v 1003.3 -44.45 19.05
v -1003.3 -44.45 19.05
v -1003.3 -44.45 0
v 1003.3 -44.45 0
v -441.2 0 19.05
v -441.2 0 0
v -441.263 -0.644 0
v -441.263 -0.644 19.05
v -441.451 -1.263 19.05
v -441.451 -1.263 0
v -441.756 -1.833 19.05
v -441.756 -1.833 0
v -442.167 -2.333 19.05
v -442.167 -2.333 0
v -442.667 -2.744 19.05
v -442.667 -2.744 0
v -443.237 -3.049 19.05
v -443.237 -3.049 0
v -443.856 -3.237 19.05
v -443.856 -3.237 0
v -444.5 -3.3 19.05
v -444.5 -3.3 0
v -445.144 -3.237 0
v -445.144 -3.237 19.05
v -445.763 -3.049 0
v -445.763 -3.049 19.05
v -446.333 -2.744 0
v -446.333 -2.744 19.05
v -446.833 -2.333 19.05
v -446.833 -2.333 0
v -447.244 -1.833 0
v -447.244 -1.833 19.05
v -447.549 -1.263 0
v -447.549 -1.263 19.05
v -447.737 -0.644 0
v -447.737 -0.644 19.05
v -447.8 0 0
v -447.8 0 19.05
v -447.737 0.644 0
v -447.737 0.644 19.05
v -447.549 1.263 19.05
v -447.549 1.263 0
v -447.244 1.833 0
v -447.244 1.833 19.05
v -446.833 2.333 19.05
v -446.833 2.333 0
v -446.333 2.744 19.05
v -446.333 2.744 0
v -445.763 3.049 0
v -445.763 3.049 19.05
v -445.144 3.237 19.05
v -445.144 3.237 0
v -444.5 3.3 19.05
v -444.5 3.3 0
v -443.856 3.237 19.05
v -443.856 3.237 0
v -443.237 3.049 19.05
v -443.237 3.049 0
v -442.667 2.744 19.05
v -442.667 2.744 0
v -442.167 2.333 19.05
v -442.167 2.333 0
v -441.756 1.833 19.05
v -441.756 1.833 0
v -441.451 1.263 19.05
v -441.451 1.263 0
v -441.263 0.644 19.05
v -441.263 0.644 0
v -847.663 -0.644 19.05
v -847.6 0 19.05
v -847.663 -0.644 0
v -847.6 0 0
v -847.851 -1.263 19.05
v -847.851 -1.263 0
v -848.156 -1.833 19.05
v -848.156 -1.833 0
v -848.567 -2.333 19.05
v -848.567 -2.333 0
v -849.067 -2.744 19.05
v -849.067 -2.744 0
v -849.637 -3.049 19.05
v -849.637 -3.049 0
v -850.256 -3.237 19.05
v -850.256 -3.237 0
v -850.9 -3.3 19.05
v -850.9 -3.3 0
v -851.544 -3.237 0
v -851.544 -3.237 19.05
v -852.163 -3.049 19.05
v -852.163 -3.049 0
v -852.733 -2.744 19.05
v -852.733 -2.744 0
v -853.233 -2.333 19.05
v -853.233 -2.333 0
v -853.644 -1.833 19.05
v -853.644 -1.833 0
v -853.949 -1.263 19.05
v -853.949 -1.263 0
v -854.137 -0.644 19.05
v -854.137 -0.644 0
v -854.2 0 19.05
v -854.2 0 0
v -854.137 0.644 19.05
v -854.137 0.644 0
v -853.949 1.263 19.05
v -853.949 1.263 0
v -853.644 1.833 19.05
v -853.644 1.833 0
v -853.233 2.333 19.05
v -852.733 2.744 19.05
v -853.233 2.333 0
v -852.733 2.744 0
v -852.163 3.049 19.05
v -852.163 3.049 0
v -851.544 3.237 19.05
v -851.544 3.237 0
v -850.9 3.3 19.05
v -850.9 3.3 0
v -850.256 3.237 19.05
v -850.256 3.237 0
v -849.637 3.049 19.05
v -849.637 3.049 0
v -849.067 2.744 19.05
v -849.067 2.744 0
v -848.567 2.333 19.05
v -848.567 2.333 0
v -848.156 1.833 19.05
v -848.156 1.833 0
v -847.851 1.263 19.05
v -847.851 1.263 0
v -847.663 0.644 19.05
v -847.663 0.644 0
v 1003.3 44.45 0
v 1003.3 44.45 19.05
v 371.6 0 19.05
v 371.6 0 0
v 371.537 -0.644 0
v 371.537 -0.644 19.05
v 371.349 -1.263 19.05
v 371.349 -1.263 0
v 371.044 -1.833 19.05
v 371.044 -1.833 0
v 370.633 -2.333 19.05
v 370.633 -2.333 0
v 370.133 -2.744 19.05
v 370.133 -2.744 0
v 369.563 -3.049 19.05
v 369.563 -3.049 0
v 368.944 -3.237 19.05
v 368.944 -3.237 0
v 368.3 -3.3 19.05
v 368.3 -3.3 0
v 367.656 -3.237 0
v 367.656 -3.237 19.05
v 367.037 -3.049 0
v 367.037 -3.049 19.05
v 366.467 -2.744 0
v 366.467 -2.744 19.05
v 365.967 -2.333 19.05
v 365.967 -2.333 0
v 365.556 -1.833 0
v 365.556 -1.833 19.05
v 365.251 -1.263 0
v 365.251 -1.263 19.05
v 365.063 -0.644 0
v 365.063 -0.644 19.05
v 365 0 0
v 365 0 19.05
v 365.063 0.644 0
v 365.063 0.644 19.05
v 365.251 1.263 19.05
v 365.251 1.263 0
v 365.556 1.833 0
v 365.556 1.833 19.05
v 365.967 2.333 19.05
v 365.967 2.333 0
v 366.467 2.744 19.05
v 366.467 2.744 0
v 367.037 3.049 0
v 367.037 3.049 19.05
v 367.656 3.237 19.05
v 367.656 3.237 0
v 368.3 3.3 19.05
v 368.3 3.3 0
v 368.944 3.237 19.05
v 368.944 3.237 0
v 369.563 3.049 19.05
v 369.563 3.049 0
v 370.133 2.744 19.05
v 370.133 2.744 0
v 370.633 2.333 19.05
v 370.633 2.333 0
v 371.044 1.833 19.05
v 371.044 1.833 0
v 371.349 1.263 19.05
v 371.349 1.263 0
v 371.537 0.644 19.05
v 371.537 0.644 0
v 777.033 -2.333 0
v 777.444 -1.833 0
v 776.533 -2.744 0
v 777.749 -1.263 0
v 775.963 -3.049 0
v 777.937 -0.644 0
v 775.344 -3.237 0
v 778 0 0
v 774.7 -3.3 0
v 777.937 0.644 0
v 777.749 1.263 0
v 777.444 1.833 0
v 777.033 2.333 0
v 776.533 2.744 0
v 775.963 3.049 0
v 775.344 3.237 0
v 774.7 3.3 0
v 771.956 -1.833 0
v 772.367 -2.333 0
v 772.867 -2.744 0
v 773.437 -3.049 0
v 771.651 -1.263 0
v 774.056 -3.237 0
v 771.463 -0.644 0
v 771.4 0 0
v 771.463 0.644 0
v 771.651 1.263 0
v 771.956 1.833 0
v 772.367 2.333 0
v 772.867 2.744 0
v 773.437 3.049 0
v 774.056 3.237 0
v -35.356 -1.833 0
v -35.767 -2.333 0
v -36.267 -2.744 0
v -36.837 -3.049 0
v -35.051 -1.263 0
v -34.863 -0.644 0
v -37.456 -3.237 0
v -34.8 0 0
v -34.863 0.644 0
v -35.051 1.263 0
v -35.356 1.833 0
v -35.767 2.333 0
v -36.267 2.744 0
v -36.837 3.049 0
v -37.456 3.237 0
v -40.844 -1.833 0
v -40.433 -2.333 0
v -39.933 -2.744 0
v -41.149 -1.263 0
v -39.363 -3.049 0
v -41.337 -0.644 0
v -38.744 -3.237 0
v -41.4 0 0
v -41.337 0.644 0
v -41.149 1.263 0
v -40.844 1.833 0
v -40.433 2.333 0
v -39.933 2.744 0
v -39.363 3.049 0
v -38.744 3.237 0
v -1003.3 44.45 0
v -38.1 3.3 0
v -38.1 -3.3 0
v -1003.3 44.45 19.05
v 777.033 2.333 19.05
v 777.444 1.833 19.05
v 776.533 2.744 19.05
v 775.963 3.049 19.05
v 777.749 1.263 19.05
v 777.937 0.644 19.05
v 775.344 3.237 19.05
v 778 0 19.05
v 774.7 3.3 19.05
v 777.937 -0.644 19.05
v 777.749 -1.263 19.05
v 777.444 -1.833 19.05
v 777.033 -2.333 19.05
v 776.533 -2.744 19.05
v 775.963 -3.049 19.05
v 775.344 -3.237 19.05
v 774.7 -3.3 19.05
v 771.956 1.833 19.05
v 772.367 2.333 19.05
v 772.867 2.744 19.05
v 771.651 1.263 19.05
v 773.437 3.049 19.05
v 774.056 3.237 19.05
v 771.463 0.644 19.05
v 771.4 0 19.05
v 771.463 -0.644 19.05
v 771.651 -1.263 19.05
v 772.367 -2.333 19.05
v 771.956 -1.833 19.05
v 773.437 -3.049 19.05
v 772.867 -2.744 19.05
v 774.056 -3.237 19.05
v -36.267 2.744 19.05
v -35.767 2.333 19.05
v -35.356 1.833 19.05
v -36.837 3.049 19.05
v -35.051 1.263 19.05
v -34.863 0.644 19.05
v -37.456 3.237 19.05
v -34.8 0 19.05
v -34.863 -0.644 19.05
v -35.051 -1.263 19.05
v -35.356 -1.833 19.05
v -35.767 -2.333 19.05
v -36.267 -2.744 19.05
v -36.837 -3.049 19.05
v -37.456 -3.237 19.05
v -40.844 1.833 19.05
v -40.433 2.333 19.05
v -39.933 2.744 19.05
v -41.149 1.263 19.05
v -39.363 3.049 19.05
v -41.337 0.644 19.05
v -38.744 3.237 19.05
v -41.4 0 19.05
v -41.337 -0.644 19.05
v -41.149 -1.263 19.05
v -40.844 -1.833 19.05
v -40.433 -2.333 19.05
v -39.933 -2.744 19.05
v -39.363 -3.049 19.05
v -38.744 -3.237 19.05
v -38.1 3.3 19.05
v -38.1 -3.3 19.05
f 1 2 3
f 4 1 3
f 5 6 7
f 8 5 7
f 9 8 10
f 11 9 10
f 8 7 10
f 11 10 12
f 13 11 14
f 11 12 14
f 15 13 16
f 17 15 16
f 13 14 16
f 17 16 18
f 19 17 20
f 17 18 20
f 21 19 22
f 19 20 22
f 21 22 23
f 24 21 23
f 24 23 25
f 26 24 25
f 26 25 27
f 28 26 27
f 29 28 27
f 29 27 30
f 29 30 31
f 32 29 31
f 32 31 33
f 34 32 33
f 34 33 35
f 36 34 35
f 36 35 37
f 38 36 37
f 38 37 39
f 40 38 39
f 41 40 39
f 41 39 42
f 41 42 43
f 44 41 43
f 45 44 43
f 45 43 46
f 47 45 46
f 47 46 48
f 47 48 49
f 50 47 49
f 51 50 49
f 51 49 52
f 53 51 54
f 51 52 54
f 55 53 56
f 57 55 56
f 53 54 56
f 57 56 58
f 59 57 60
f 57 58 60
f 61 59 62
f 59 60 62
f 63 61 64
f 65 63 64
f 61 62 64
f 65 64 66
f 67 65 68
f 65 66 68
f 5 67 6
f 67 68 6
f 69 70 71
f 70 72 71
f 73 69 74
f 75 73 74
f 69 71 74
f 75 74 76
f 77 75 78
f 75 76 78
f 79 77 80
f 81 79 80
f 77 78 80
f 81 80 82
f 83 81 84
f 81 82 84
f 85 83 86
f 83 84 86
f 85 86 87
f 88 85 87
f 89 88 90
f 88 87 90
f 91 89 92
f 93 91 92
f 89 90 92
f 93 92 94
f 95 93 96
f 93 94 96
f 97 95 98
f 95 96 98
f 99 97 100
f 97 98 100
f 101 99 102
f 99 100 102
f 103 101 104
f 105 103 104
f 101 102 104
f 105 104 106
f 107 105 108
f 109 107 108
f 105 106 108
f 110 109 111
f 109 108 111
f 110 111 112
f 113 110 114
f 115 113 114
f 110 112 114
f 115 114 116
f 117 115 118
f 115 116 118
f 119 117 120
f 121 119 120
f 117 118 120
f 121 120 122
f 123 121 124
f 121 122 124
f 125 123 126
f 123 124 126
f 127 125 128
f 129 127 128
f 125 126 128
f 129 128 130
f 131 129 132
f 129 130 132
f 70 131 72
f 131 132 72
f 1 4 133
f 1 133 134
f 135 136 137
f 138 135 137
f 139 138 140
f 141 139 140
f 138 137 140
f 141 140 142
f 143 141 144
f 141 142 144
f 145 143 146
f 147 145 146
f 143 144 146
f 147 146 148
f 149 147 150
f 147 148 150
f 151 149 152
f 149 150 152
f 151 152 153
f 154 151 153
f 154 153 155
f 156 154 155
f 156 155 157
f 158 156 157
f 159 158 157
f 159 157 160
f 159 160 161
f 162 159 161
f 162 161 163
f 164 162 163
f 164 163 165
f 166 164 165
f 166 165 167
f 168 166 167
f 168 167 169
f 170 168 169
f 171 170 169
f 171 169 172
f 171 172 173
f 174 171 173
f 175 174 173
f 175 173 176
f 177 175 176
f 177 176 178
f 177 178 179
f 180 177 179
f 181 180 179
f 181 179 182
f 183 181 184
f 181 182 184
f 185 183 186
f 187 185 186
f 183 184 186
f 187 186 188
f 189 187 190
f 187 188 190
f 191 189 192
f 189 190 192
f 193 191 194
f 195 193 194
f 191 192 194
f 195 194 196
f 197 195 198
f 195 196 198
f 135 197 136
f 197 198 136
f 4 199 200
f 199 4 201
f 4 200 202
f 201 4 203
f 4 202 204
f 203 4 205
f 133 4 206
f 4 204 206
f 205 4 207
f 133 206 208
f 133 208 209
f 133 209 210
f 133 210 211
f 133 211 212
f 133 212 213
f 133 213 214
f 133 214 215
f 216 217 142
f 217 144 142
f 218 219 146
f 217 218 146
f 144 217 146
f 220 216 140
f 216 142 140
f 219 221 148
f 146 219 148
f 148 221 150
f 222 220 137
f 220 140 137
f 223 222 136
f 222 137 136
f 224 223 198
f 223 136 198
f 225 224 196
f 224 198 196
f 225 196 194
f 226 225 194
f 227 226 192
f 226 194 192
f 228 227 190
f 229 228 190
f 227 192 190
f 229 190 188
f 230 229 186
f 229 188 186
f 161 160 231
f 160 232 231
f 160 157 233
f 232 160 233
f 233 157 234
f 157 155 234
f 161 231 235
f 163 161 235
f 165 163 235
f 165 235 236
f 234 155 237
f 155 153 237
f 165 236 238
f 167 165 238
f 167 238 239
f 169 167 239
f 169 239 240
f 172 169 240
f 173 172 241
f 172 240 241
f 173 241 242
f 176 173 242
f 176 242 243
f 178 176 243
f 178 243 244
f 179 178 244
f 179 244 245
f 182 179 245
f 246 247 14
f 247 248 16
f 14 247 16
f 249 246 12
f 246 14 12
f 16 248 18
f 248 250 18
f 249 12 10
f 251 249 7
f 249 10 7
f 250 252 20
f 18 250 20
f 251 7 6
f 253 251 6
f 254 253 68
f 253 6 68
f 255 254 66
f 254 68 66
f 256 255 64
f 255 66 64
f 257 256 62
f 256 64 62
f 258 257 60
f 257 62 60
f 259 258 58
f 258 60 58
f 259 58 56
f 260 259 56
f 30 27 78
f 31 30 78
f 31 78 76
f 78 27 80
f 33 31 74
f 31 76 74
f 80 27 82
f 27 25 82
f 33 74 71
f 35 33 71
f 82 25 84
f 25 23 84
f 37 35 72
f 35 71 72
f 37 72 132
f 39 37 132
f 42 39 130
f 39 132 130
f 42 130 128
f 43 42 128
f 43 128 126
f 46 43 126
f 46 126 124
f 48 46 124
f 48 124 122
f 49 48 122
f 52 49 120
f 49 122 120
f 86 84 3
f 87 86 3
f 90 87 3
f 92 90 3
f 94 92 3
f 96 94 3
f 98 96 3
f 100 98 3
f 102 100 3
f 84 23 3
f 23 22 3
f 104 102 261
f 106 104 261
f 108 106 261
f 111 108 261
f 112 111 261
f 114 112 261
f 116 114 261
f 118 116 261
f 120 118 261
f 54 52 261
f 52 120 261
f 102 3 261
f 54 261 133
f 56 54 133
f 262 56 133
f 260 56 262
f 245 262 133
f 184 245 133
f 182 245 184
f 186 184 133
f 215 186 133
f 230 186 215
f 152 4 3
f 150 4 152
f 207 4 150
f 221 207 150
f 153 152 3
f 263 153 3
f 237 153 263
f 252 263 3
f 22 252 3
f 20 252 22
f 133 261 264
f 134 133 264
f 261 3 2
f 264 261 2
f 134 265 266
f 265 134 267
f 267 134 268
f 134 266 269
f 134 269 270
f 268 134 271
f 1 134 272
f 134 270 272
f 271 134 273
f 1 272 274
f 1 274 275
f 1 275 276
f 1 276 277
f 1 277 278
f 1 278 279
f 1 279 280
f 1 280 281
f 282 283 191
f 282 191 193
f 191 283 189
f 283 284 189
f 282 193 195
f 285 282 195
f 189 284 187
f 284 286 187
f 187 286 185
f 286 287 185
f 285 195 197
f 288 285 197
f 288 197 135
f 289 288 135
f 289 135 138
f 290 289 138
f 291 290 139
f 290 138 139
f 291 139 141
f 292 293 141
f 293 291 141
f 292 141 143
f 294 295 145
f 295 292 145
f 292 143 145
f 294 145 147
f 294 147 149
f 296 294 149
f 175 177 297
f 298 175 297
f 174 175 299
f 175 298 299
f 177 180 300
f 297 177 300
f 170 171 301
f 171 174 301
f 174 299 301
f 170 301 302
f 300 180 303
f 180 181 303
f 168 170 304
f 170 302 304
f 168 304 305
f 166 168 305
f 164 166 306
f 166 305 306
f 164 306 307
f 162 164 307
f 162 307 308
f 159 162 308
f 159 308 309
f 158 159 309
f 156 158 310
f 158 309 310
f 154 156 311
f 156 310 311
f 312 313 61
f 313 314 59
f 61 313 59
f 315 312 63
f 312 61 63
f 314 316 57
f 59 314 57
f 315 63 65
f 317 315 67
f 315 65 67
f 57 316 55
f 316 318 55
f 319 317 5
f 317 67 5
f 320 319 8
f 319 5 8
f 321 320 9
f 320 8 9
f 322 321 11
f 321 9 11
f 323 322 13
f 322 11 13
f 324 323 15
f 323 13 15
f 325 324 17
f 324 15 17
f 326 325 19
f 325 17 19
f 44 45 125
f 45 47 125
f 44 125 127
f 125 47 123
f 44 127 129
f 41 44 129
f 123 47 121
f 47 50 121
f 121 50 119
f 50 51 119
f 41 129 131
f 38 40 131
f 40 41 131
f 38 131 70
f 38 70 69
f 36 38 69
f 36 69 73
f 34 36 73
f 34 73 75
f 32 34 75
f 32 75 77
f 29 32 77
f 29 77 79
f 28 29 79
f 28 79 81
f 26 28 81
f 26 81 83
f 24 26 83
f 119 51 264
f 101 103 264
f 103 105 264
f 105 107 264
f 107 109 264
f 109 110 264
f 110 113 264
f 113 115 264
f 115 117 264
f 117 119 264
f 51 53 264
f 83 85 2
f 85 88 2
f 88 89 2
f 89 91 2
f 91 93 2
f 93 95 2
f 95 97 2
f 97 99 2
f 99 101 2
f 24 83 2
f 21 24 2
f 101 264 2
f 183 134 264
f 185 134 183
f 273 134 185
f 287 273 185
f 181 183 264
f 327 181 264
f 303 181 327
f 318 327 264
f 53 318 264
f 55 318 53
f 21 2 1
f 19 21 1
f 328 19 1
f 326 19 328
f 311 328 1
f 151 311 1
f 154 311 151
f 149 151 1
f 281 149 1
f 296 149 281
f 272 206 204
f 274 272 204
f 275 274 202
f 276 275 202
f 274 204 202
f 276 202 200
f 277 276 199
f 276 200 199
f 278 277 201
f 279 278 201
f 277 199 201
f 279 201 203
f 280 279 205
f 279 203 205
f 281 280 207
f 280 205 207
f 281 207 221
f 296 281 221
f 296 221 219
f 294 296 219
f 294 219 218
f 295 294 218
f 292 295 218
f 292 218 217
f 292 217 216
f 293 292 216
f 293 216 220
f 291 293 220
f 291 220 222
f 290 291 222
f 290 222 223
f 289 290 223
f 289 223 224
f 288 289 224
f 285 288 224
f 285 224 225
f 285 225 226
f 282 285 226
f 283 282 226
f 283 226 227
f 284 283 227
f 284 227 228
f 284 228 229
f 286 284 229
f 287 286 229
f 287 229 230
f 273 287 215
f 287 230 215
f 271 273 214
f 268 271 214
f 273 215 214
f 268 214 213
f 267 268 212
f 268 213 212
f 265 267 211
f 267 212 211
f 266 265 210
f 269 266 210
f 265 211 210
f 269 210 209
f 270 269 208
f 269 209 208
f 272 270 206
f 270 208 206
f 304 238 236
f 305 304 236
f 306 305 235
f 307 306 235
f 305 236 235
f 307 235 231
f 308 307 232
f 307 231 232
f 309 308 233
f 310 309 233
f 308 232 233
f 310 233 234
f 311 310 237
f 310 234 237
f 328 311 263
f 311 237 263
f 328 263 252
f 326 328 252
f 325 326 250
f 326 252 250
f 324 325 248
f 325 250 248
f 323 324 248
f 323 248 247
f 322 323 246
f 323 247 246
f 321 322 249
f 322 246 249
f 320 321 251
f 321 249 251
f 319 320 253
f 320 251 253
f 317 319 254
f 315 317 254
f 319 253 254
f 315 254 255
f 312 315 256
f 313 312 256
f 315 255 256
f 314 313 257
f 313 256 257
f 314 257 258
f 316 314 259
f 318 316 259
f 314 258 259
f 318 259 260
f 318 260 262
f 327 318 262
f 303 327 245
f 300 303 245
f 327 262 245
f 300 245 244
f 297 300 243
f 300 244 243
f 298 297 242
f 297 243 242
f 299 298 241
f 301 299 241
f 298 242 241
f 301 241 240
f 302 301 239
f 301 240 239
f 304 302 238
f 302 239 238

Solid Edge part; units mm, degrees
sketch "Sketch1" plane through (0, 0, 0) normal (1, 0, 0) x (0, 1, 0)
  line L0 (-44.45, 0) -> (44.45, 0)
  line L1 (44.45, 0) -> (44.45, 19.05)
  line L2 (44.45, 19.05) -> (-44.45, 19.05)
  line L3 (-44.45, 19.05) -> (-44.45, 0)
  dimension "D1" = 88.9
  dimension "D2" = 19.05
extrude "Protrusion1" add sketch "Sketch1" along normal mid plane 2006.6
sketch "Sketch2" plane through (0, 0, 0) normal (0, 0, -1) x (1, 0, 0)
  circle A0 centre (-850.9, 0) radius 3.3
  dimension "D1" = 6.6
  dimension "D2" = 152.4
extrude "Cutout1" cut sketch "Sketch2" against normal through all
pattern_linear "Pattern1" count 5 spacing 406.4 along (1, 0, 0) of "Cutout1"
